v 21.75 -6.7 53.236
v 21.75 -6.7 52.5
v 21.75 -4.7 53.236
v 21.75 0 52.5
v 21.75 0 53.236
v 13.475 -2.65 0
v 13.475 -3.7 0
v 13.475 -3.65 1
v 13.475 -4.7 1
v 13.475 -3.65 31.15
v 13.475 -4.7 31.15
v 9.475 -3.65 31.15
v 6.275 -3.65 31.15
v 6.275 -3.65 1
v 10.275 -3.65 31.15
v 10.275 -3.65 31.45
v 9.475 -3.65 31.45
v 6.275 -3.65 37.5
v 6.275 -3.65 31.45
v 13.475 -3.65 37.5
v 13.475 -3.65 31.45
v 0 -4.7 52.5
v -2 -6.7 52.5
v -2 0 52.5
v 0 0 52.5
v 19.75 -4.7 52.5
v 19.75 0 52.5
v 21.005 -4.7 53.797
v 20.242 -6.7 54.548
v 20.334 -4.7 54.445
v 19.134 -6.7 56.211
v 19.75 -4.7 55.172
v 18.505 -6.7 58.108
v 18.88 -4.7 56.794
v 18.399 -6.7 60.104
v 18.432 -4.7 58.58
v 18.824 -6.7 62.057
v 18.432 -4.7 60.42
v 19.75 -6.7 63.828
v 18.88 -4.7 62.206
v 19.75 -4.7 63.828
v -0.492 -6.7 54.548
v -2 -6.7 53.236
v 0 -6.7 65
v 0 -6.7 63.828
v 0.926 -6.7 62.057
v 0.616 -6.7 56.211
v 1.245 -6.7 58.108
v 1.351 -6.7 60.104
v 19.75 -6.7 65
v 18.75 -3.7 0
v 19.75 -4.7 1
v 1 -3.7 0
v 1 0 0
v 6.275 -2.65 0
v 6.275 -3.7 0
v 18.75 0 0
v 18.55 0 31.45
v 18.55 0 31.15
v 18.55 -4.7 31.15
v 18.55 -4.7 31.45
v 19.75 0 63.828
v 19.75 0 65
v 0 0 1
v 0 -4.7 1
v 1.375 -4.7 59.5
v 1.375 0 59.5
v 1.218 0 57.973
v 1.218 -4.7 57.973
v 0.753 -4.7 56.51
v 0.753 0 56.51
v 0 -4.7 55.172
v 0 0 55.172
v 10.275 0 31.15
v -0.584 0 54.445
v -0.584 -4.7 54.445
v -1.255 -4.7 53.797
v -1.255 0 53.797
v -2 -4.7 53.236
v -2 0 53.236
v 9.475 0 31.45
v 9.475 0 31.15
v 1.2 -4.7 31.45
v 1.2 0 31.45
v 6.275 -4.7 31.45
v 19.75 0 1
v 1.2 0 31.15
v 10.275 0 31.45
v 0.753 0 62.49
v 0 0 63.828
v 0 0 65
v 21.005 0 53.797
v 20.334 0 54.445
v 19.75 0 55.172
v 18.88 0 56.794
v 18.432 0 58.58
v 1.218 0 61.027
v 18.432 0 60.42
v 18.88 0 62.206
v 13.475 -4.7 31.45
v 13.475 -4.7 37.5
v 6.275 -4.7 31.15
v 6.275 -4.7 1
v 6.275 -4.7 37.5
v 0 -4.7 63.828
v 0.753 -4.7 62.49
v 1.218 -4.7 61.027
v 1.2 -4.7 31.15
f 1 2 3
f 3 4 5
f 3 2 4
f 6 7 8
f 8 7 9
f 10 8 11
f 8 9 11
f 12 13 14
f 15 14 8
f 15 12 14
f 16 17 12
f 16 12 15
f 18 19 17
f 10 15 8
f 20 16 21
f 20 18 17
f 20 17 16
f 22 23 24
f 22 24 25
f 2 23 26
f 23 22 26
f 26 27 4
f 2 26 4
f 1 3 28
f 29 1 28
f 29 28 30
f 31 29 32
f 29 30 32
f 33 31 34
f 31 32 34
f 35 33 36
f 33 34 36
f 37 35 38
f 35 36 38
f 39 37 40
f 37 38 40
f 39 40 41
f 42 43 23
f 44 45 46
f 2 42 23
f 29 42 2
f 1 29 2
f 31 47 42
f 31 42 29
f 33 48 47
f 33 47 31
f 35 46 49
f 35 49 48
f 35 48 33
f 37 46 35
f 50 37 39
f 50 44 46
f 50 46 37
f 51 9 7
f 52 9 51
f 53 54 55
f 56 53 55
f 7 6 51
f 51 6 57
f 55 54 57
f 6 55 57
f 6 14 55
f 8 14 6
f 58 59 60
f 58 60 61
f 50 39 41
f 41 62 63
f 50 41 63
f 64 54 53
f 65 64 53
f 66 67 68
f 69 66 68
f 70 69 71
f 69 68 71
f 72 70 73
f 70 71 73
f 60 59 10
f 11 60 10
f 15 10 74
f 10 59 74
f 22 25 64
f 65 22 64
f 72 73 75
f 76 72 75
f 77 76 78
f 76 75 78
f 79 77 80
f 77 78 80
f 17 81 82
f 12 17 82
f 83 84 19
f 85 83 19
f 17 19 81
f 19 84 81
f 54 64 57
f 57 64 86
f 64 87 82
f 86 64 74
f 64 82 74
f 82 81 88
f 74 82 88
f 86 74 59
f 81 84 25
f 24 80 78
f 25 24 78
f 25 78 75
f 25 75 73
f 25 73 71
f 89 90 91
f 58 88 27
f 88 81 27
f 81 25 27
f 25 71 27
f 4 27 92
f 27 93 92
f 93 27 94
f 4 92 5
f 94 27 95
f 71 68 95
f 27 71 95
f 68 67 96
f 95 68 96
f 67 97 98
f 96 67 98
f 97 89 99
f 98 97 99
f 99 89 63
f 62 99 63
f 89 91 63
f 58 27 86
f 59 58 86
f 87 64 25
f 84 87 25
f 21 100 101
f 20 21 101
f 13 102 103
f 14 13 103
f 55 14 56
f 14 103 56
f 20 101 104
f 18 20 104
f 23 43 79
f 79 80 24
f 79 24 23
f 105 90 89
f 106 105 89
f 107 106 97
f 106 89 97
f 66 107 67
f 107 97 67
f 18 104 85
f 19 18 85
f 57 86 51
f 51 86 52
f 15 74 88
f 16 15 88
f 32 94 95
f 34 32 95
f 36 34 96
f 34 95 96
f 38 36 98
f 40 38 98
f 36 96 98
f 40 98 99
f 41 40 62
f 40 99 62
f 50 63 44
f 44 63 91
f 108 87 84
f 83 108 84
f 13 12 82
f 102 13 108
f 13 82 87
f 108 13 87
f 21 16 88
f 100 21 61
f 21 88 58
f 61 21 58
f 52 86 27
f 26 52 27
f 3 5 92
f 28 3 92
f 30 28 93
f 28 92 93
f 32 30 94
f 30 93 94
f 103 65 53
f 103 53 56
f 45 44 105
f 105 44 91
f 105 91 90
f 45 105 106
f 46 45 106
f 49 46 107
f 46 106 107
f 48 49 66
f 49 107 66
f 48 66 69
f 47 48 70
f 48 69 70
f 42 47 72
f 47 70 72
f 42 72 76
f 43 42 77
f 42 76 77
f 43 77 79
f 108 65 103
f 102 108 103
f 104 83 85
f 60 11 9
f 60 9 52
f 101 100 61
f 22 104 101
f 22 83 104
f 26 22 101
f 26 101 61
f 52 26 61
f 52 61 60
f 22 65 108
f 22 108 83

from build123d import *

# Parameters (mm, degrees)
F0_W     = 1.2
F0_H     = 0.3
F1_DEPTH = 4.7
F3_DEPTH = 1.05
F6_DEPTH = 2
F7_SIZE  = 1


with BuildPart() as f1:
    # F0 (on Front) → F1 (new body)
    with BuildSketch(Plane.XZ):
        with BuildLine():
            Line((0, 31.15), (0, 0))
            Line((0, 0), (19.75, 0))
            Line((19.75, 0), (19.75, 31.15))
            Line((19.75, 31.15), (18.55, 31.15))
            Line((18.55, 31.15), (10.275, 31.15))
            Line((10.275, 31.15), (10.275, 31.45))
            Line((10.275, 31.45), (18.55, 31.45))
            Line((18.55, 31.45), (19.75, 31.45))
            Line((19.75, 31.45), (19.75, 52.5))
            Line((19.75, 52.5), (19.75, 55.1716775767))
            ThreePointArc((19.75, 55.1716775767), (18.375, 59.5), (19.75, 63.8283224233))
            Line((19.75, 63.8283224233), (19.75, 65))
            Line((19.75, 65), (0, 65))
            Line((0, 65), (0, 63.8283224233))
            ThreePointArc((0, 63.8283224233), (1.0229892277, 61.7707377656), (1.375, 59.5))
            ThreePointArc((1.375, 59.5), (1.0229892277, 57.2292622344), (0, 55.1716775767))
            Line((0, 55.1716775767), (0, 52.5))
            Line((0, 52.5), (0, 31.45))
            Line((0, 31.45), (1.2, 31.45))
            Line((1.2, 31.45), (9.475, 31.45))
            Line((9.475, 31.45), (9.475, 31.15))
            Line((9.475, 31.15), (1.2, 31.15))
            Line((1.2, 31.15), (0, 31.15))
        make_face()
        with BuildLine():
            Line((-2, 52.5), (0, 52.5))
            Line((0, 52.5), (0, 55.1716775767))
            ThreePointArc((0, 55.1716775767), (-0.9094386331, 54.1103878035), (-2, 53.2362650918))
            Line((-2, 53.2362650918), (-2, 52.5))
        make_face()
        with BuildLine():
            Line((19.75, 55.1716775767), (19.75, 52.5))
            Line((19.75, 52.5), (21.75, 52.5))
            Line((21.75, 52.5), (21.75, 53.2362650918))
            ThreePointArc((21.75, 53.2362650918), (20.6594386331, 54.1103878035), (19.75, 55.1716775767))
        make_face()
        with Locations((0.6, 31.3)):
            Rectangle(F0_W, F0_H)
        with Locations((19.15, 31.3)):
            Rectangle(F0_W, F0_H)
    extrude(amount=F1_DEPTH)

    # F2 (on face) → F3 (cut)
    with BuildSketch(Plane.XZ.offset(4.7)):
        Polygon((13.475, 37.5), (6.275, 37.5), (6.275, 2.2), (6.275, 0), (13.475, 0), (13.475, 2.2), align=None)
    extrude(amount=-F3_DEPTH, mode=Mode.SUBTRACT)

    # F5 (on face) → F6 (join)
    with BuildSketch(Plane.XZ.offset(4.7)):
        with BuildLine():
            Line((-2, 52.5), (0, 52.5))
            Line((0, 52.5), (19.75, 52.5))
            Line((19.75, 52.5), (21.75, 52.5))
            Line((21.75, 52.5), (21.75, 53.2362650918))
            ThreePointArc((21.75, 53.2362650918), (18.5052276407, 58.1084342015), (19.75, 63.8283224233))
            Line((19.75, 63.8283224233), (19.75, 65))
            Line((19.75, 65), (0, 65))
            Line((0, 65), (0, 63.8283224233))
            ThreePointArc((0, 63.8283224233), (1.2447723593, 58.1084342015), (-2, 53.2362650918))
            Line((-2, 53.2362650918), (-2, 52.5))
        make_face()
    extrude(amount=F6_DEPTH)

    # F7
    f7_edges = [f1.edges().sort_by_distance(p)[0] for p in [
        (0, -2.35, 0),
        (19.75, -2.35, 0),
        (3.1375, -4.7, 0),
        (16.6125, -4.7, 0),
        (9.875, -3.65, 0),
    ]]
    chamfer(f7_edges, length=F7_SIZE)


solid = f1.part
